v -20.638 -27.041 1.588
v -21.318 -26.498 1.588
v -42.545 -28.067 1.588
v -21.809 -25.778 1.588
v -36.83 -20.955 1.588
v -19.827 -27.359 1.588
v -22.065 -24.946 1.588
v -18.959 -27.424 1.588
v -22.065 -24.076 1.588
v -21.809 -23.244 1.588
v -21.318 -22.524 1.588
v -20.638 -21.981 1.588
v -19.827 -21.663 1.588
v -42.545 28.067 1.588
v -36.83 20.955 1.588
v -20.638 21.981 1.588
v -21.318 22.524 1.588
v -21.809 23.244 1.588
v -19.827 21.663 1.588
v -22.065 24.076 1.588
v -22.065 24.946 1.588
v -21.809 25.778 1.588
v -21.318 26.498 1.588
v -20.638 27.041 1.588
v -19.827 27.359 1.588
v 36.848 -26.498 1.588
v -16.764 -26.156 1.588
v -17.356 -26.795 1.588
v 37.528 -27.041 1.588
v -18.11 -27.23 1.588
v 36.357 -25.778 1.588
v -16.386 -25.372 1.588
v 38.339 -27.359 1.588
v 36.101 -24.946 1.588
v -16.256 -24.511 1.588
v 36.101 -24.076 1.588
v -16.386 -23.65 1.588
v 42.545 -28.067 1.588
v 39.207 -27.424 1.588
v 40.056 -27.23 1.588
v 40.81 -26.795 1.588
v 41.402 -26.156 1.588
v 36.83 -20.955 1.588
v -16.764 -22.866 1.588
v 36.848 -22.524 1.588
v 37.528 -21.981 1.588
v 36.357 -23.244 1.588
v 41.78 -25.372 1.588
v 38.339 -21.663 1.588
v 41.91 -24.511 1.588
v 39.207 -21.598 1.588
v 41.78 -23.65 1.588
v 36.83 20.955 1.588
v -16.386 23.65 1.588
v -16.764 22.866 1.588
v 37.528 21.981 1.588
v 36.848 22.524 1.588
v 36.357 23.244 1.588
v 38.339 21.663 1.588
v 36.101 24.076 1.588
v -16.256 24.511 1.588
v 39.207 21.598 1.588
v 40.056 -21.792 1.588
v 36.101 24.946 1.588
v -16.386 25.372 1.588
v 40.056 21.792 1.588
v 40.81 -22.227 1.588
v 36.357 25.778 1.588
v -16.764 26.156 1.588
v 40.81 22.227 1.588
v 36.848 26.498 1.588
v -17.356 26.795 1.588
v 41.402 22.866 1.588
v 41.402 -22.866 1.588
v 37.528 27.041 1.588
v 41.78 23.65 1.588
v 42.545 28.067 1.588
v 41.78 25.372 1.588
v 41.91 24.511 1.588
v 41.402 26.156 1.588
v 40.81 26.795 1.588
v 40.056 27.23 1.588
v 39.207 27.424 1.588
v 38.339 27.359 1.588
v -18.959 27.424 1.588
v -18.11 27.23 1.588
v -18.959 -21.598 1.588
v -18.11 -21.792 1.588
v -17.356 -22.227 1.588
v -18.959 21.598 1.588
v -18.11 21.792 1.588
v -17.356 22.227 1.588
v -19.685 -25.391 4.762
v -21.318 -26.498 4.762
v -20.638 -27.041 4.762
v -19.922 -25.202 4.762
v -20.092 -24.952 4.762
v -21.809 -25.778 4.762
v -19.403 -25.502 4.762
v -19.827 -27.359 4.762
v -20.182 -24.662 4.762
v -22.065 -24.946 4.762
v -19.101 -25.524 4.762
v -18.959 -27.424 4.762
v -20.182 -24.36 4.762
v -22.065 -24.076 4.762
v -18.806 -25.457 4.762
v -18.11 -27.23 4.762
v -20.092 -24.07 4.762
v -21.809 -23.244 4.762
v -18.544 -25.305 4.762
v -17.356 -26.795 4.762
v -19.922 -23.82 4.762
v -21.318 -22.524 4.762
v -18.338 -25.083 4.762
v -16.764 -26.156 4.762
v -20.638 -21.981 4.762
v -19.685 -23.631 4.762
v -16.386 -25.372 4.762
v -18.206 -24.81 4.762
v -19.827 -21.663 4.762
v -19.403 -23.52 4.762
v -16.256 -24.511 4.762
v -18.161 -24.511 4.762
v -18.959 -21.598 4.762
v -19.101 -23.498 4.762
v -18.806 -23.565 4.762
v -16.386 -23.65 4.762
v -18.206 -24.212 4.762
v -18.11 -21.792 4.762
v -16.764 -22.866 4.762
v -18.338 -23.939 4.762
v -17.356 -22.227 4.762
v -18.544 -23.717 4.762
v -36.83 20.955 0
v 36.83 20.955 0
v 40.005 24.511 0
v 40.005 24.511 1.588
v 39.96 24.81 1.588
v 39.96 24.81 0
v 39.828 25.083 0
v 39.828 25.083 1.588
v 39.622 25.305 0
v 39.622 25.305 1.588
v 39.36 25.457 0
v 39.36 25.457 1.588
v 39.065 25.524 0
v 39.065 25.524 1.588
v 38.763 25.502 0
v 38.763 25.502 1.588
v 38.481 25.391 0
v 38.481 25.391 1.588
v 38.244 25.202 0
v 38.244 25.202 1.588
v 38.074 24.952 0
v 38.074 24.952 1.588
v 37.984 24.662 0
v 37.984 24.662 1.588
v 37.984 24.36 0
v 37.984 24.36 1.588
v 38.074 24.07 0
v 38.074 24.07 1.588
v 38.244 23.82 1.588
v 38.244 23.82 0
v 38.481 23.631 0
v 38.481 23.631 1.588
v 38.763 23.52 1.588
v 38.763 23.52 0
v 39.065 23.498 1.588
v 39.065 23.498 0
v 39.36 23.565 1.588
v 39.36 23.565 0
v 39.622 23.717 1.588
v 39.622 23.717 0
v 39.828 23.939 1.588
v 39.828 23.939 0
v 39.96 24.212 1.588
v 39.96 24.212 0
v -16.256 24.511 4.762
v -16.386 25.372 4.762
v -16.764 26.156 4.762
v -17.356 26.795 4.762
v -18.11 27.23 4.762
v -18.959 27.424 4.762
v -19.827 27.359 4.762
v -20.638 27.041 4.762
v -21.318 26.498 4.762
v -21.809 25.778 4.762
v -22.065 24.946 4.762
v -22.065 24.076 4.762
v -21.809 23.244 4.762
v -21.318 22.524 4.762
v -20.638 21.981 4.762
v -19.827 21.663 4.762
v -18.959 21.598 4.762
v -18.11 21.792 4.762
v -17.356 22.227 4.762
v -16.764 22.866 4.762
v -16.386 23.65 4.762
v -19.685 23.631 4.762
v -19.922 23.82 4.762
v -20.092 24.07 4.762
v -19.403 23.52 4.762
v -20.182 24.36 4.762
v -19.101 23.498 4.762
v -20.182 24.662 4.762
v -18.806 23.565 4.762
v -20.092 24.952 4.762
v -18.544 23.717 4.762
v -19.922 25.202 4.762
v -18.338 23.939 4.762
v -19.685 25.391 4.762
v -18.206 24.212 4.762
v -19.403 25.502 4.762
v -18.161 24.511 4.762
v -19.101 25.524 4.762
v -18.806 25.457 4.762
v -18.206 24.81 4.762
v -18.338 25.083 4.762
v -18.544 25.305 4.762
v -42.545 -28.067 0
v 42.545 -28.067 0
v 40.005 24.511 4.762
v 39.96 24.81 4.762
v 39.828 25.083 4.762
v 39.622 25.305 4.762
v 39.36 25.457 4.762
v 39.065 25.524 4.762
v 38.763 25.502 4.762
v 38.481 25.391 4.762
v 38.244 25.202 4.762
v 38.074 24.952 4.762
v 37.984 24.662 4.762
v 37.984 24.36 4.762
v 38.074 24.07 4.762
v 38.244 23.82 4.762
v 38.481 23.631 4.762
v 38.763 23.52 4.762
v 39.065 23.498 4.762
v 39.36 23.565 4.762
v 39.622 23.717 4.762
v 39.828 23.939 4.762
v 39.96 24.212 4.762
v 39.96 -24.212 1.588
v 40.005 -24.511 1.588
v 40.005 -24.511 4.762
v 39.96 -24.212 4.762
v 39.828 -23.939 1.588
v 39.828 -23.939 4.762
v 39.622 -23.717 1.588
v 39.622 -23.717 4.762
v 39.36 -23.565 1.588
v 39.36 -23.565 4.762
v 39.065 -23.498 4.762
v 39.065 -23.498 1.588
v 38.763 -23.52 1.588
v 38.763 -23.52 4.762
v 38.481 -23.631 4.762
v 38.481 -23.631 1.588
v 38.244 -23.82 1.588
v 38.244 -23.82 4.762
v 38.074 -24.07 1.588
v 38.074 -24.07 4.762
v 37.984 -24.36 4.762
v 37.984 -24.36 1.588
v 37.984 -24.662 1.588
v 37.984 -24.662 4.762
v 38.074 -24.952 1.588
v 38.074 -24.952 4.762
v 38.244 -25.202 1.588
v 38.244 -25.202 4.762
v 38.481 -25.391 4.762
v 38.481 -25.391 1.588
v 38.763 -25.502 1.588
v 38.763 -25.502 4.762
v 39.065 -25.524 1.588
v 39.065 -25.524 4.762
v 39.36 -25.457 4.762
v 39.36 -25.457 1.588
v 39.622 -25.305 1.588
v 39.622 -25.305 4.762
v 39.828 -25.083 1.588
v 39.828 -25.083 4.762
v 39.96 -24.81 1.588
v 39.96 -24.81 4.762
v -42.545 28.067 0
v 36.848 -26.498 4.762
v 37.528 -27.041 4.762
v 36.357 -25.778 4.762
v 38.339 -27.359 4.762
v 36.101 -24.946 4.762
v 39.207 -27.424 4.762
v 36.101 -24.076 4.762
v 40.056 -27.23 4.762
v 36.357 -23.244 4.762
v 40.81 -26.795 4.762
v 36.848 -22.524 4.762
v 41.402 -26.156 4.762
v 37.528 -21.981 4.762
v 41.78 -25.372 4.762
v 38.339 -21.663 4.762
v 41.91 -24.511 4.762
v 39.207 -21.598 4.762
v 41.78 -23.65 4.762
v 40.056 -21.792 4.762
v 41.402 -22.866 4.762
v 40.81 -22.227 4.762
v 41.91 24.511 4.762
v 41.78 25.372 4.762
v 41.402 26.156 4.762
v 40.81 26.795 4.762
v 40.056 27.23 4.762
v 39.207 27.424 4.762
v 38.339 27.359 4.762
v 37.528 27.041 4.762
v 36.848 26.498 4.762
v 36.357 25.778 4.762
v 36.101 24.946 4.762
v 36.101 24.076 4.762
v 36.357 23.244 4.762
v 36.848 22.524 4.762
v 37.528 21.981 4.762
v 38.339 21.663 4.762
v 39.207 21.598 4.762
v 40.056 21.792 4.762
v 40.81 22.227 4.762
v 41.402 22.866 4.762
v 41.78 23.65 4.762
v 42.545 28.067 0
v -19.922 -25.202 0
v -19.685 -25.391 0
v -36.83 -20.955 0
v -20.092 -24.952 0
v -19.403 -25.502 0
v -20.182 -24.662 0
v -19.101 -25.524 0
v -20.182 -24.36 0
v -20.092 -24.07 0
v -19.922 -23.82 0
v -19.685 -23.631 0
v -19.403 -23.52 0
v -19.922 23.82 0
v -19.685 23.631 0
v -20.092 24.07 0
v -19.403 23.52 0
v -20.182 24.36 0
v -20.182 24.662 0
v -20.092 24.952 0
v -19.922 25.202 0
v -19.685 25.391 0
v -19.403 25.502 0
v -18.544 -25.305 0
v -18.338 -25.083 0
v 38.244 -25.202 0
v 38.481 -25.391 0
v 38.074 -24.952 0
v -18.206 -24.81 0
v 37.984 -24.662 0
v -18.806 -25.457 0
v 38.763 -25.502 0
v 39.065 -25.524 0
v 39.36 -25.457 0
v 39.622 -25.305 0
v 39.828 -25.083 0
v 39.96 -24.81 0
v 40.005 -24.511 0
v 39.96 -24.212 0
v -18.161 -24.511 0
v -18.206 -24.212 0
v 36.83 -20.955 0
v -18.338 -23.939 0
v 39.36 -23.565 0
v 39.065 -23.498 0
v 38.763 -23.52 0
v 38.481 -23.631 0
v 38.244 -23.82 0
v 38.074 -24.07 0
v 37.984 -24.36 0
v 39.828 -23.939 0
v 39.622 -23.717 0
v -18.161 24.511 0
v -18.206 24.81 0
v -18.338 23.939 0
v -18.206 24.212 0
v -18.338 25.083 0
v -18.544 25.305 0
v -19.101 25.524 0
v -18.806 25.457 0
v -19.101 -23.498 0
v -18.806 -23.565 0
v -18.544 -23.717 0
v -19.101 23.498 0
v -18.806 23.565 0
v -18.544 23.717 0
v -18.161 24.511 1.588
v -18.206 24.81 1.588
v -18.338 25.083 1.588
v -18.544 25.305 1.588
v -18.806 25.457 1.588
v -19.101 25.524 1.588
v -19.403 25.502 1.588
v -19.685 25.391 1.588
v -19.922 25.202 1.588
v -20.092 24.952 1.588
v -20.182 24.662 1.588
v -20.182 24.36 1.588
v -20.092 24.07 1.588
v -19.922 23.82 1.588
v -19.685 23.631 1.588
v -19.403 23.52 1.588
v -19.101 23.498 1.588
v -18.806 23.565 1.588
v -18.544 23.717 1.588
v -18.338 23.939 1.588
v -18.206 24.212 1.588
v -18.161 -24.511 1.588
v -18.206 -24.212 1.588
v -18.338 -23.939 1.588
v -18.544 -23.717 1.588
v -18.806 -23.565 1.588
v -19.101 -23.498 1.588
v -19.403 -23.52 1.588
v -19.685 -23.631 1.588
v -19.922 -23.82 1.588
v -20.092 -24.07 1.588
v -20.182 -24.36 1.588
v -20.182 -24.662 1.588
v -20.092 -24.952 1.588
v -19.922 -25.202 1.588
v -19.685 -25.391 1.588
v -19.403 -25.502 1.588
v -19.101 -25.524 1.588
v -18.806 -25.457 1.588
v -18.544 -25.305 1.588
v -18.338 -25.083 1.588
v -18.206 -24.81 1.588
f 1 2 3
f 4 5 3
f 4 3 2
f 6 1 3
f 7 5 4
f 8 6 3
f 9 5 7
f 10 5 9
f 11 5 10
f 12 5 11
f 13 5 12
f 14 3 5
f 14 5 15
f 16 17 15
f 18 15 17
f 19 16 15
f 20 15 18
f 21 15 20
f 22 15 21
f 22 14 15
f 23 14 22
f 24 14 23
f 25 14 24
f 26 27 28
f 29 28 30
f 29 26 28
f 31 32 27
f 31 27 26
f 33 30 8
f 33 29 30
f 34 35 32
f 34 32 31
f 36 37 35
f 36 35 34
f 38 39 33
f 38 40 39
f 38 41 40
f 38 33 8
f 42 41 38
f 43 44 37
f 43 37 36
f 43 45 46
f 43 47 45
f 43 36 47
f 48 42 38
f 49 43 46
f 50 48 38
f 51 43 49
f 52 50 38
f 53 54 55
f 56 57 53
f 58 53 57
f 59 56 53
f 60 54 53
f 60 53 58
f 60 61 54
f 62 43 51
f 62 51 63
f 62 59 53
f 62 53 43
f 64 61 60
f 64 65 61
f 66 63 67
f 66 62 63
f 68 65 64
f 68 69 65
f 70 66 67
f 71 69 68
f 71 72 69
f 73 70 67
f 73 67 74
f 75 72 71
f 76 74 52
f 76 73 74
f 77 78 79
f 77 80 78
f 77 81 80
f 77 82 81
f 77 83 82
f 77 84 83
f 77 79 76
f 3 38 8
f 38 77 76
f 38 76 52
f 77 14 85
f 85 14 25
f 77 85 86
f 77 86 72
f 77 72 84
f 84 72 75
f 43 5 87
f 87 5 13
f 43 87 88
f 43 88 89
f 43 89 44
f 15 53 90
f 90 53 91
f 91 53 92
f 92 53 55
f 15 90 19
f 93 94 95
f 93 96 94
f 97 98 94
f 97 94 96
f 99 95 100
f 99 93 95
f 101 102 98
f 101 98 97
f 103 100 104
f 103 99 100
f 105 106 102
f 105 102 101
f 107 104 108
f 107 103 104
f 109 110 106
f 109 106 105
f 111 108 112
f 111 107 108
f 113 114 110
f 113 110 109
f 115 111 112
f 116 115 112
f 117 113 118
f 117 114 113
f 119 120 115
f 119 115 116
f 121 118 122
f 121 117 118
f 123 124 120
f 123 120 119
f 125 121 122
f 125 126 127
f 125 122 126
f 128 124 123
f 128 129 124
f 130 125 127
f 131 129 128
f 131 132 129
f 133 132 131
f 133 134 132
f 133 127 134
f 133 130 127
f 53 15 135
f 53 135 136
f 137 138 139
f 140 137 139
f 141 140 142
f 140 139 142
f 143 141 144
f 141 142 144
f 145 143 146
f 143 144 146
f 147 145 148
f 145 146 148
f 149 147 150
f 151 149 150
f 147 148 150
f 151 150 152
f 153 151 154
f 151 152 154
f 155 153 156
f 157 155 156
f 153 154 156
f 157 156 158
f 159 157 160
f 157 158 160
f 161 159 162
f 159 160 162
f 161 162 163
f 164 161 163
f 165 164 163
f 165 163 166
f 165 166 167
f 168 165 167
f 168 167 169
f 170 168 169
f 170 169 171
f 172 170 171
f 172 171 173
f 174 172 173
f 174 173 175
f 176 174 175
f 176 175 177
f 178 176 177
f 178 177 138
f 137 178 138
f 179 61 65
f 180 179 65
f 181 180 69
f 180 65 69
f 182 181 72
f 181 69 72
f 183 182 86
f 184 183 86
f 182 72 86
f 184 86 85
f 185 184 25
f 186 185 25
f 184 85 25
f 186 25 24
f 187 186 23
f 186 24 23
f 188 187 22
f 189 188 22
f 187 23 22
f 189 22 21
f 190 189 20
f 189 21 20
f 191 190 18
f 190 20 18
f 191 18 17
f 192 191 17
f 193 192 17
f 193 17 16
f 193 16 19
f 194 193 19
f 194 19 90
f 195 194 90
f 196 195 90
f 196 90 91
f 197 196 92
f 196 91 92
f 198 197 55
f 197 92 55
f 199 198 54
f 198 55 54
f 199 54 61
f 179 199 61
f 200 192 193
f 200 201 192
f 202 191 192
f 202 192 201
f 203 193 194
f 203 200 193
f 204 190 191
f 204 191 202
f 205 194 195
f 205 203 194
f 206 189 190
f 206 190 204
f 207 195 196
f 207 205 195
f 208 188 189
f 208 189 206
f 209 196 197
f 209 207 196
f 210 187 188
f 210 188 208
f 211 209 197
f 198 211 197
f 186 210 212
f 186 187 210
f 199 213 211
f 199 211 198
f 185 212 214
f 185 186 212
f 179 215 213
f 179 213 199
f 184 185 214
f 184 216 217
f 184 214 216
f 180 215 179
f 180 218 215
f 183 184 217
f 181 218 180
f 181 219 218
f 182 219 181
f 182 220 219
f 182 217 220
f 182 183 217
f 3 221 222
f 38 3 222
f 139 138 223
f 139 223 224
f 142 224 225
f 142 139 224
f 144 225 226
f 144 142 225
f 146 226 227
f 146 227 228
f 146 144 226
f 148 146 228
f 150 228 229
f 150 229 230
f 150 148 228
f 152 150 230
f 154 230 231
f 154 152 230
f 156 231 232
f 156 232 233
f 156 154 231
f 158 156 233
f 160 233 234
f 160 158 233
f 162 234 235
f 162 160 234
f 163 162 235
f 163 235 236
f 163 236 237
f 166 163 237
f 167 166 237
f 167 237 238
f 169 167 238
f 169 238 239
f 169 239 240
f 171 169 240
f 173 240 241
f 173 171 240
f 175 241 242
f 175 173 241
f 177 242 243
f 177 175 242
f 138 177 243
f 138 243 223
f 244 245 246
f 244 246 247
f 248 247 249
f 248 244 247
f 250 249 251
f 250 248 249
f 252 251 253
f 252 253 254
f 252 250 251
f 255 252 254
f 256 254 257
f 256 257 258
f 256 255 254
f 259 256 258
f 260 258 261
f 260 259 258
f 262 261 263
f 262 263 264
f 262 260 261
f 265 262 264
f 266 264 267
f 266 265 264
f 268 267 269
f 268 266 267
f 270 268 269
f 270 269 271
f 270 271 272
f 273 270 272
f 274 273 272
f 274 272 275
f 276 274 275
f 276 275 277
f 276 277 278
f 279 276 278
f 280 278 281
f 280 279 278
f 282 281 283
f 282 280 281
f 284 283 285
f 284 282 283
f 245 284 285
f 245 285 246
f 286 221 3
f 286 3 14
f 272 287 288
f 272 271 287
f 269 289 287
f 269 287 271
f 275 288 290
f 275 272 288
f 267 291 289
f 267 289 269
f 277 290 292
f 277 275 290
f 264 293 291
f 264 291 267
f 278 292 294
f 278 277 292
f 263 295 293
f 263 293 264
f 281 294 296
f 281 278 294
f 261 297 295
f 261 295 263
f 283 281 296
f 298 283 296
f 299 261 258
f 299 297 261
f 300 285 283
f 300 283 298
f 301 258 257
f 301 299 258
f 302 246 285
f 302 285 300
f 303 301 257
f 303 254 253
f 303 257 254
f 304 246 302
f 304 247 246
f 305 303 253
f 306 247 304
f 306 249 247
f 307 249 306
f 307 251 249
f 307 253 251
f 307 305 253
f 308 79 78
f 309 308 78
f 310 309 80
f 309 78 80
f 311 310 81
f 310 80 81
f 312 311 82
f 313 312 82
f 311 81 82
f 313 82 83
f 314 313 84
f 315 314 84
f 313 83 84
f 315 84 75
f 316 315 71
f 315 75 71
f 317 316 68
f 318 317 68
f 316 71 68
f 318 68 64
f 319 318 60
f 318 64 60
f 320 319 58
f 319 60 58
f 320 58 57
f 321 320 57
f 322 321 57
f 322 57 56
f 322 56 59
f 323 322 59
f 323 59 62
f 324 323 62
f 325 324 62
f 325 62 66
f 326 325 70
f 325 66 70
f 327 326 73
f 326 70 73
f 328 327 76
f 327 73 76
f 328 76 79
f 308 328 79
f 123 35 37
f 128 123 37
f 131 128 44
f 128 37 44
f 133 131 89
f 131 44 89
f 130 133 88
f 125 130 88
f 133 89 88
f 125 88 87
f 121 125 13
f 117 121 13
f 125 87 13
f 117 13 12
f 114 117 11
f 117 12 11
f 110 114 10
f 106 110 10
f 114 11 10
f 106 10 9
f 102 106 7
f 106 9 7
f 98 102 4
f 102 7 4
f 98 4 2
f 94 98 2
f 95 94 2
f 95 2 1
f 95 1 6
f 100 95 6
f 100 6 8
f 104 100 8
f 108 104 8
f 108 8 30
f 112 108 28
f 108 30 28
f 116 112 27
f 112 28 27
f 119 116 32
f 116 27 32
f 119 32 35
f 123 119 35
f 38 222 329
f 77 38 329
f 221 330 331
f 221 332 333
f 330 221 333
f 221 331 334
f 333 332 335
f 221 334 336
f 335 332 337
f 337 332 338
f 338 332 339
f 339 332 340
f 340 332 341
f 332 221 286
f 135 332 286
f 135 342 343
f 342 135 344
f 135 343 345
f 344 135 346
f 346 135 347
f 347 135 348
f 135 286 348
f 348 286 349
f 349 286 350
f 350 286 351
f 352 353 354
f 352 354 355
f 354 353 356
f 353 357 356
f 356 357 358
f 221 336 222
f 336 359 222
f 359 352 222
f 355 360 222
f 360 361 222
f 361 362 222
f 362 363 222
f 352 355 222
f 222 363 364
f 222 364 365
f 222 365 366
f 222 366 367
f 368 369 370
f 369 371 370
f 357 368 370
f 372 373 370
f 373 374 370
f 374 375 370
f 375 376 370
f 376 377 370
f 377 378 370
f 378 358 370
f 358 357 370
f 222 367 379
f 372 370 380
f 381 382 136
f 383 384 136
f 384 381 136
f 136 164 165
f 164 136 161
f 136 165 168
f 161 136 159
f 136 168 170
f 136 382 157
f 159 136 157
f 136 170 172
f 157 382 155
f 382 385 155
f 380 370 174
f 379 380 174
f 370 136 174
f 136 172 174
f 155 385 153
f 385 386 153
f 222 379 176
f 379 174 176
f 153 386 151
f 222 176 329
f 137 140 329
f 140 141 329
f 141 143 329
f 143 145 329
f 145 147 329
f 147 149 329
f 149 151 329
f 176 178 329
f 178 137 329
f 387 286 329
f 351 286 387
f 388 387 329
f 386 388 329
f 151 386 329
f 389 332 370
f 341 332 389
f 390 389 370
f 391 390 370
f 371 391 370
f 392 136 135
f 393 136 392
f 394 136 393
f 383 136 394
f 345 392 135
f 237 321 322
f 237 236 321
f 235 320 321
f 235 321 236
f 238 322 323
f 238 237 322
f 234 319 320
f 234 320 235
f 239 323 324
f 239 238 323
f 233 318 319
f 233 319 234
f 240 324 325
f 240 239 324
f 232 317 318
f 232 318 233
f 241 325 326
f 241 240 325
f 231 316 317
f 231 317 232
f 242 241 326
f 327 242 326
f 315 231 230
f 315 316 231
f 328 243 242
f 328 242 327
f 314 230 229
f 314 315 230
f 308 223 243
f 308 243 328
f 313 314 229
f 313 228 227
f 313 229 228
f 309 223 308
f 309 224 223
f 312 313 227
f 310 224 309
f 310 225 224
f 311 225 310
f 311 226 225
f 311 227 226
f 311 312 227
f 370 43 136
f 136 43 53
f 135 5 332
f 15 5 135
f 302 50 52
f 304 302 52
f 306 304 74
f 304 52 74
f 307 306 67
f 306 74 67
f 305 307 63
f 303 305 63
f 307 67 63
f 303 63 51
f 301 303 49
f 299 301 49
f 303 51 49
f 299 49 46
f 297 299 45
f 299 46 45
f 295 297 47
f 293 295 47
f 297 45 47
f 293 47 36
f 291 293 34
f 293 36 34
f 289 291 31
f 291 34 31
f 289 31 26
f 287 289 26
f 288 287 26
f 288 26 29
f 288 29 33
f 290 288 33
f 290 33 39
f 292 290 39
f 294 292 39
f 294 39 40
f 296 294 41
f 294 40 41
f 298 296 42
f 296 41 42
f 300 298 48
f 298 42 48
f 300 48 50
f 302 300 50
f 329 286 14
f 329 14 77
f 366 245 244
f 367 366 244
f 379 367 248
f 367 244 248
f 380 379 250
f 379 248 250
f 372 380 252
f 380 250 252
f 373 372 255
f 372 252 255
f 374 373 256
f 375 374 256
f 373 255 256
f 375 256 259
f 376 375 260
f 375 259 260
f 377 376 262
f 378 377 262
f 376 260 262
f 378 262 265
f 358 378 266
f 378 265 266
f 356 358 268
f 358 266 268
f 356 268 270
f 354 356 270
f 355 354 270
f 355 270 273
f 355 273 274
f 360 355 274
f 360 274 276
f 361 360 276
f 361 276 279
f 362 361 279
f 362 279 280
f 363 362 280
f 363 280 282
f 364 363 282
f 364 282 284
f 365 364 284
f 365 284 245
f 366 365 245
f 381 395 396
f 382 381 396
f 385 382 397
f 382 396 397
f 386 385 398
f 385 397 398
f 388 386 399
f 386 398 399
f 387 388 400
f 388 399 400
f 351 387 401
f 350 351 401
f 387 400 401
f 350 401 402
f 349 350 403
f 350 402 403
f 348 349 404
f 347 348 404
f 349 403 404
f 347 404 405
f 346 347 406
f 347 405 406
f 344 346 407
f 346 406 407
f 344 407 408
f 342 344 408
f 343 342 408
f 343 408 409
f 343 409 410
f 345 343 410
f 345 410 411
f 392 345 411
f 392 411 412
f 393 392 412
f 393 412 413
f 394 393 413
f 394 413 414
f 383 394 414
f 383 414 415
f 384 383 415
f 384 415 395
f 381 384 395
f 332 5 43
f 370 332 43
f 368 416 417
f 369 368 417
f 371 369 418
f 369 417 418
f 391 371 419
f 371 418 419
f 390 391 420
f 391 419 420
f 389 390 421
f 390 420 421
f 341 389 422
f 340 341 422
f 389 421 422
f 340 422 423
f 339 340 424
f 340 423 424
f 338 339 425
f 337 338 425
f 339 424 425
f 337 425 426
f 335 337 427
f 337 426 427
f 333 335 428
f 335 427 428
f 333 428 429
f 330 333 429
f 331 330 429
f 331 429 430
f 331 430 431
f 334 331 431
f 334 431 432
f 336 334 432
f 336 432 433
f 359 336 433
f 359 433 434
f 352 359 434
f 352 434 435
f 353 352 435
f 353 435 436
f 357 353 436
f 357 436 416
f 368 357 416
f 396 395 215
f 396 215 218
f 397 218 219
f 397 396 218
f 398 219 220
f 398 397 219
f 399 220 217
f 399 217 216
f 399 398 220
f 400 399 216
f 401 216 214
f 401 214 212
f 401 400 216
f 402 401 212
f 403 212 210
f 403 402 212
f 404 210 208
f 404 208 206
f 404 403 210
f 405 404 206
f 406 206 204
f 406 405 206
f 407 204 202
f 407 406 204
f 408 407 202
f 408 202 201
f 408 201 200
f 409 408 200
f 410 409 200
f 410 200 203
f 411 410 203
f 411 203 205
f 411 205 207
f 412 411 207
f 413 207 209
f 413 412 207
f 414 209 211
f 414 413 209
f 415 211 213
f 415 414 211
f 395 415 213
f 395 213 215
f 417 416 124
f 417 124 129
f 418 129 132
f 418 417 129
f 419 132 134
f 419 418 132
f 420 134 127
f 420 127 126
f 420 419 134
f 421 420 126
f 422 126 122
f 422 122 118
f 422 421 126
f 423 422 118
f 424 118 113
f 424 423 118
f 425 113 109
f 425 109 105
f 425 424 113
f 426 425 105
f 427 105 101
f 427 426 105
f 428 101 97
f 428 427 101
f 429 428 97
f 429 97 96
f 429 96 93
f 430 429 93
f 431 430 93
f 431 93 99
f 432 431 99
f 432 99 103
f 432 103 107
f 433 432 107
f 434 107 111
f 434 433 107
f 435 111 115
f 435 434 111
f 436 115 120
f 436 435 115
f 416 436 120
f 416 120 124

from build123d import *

# Parameters (mm, degrees)
F0_W     = 85.09
F0_H     = 56.134
F1_DEPTH = 1.5875
F2_W     = 73.66
F2_H     = 41.91
F3_DEPTH = 6.35
F4_R     = 2.921
F4_R_2   = 1.016
F5_DEPTH = 3.175
F6_DEPTH = 6.35


with BuildPart() as f1:
    # F0 (on Top) → F1 (new body)
    with BuildSketch(Plane.XY):
        Rectangle(F0_W, F0_H)
    extrude(amount=F1_DEPTH)

    # F2 (on face) → F3 (cut)
    with BuildSketch(Plane.XY.offset(1.5875)):
        Rectangle(F2_W, F2_H)
    extrude(amount=-F3_DEPTH, mode=Mode.SUBTRACT)

    # F4 (on face) → F5 (join)
    with BuildSketch(Plane.XY.offset(1.5875)):
        with Locations((38.989, 24.511)):
            Circle(F4_R)
        with Locations((38.989, 24.511)):
            Circle(F4_R_2, mode=Mode.SUBTRACT)
        with Locations((38.989, -24.511)):
            Circle(F4_R)
        with Locations((38.989, -24.511)):
            Circle(F4_R_2, mode=Mode.SUBTRACT)
        with Locations((-19.177, 24.511)):
            Circle(F4_R)
        with Locations((-19.177, 24.511)):
            Circle(F4_R_2, mode=Mode.SUBTRACT)
        with Locations((-19.177, -24.511)):
            Circle(F4_R)
        with Locations((-19.177, -24.511)):
            Circle(F4_R_2, mode=Mode.SUBTRACT)
    extrude(amount=F5_DEPTH)

    # F4 (on face) → F6 (cut)
    with BuildSketch(Plane.XY.offset(1.5875)):
        with Locations((38.989, -24.511)):
            Circle(F4_R_2)
        with Locations((-19.177, 24.511)):
            Circle(F4_R_2)
        with Locations((38.989, 24.511)):
            Circle(F4_R_2)
        with Locations((-19.177, -24.511)):
            Circle(F4_R_2)
    extrude(amount=-F6_DEPTH, mode=Mode.SUBTRACT)


solid = f1.part
